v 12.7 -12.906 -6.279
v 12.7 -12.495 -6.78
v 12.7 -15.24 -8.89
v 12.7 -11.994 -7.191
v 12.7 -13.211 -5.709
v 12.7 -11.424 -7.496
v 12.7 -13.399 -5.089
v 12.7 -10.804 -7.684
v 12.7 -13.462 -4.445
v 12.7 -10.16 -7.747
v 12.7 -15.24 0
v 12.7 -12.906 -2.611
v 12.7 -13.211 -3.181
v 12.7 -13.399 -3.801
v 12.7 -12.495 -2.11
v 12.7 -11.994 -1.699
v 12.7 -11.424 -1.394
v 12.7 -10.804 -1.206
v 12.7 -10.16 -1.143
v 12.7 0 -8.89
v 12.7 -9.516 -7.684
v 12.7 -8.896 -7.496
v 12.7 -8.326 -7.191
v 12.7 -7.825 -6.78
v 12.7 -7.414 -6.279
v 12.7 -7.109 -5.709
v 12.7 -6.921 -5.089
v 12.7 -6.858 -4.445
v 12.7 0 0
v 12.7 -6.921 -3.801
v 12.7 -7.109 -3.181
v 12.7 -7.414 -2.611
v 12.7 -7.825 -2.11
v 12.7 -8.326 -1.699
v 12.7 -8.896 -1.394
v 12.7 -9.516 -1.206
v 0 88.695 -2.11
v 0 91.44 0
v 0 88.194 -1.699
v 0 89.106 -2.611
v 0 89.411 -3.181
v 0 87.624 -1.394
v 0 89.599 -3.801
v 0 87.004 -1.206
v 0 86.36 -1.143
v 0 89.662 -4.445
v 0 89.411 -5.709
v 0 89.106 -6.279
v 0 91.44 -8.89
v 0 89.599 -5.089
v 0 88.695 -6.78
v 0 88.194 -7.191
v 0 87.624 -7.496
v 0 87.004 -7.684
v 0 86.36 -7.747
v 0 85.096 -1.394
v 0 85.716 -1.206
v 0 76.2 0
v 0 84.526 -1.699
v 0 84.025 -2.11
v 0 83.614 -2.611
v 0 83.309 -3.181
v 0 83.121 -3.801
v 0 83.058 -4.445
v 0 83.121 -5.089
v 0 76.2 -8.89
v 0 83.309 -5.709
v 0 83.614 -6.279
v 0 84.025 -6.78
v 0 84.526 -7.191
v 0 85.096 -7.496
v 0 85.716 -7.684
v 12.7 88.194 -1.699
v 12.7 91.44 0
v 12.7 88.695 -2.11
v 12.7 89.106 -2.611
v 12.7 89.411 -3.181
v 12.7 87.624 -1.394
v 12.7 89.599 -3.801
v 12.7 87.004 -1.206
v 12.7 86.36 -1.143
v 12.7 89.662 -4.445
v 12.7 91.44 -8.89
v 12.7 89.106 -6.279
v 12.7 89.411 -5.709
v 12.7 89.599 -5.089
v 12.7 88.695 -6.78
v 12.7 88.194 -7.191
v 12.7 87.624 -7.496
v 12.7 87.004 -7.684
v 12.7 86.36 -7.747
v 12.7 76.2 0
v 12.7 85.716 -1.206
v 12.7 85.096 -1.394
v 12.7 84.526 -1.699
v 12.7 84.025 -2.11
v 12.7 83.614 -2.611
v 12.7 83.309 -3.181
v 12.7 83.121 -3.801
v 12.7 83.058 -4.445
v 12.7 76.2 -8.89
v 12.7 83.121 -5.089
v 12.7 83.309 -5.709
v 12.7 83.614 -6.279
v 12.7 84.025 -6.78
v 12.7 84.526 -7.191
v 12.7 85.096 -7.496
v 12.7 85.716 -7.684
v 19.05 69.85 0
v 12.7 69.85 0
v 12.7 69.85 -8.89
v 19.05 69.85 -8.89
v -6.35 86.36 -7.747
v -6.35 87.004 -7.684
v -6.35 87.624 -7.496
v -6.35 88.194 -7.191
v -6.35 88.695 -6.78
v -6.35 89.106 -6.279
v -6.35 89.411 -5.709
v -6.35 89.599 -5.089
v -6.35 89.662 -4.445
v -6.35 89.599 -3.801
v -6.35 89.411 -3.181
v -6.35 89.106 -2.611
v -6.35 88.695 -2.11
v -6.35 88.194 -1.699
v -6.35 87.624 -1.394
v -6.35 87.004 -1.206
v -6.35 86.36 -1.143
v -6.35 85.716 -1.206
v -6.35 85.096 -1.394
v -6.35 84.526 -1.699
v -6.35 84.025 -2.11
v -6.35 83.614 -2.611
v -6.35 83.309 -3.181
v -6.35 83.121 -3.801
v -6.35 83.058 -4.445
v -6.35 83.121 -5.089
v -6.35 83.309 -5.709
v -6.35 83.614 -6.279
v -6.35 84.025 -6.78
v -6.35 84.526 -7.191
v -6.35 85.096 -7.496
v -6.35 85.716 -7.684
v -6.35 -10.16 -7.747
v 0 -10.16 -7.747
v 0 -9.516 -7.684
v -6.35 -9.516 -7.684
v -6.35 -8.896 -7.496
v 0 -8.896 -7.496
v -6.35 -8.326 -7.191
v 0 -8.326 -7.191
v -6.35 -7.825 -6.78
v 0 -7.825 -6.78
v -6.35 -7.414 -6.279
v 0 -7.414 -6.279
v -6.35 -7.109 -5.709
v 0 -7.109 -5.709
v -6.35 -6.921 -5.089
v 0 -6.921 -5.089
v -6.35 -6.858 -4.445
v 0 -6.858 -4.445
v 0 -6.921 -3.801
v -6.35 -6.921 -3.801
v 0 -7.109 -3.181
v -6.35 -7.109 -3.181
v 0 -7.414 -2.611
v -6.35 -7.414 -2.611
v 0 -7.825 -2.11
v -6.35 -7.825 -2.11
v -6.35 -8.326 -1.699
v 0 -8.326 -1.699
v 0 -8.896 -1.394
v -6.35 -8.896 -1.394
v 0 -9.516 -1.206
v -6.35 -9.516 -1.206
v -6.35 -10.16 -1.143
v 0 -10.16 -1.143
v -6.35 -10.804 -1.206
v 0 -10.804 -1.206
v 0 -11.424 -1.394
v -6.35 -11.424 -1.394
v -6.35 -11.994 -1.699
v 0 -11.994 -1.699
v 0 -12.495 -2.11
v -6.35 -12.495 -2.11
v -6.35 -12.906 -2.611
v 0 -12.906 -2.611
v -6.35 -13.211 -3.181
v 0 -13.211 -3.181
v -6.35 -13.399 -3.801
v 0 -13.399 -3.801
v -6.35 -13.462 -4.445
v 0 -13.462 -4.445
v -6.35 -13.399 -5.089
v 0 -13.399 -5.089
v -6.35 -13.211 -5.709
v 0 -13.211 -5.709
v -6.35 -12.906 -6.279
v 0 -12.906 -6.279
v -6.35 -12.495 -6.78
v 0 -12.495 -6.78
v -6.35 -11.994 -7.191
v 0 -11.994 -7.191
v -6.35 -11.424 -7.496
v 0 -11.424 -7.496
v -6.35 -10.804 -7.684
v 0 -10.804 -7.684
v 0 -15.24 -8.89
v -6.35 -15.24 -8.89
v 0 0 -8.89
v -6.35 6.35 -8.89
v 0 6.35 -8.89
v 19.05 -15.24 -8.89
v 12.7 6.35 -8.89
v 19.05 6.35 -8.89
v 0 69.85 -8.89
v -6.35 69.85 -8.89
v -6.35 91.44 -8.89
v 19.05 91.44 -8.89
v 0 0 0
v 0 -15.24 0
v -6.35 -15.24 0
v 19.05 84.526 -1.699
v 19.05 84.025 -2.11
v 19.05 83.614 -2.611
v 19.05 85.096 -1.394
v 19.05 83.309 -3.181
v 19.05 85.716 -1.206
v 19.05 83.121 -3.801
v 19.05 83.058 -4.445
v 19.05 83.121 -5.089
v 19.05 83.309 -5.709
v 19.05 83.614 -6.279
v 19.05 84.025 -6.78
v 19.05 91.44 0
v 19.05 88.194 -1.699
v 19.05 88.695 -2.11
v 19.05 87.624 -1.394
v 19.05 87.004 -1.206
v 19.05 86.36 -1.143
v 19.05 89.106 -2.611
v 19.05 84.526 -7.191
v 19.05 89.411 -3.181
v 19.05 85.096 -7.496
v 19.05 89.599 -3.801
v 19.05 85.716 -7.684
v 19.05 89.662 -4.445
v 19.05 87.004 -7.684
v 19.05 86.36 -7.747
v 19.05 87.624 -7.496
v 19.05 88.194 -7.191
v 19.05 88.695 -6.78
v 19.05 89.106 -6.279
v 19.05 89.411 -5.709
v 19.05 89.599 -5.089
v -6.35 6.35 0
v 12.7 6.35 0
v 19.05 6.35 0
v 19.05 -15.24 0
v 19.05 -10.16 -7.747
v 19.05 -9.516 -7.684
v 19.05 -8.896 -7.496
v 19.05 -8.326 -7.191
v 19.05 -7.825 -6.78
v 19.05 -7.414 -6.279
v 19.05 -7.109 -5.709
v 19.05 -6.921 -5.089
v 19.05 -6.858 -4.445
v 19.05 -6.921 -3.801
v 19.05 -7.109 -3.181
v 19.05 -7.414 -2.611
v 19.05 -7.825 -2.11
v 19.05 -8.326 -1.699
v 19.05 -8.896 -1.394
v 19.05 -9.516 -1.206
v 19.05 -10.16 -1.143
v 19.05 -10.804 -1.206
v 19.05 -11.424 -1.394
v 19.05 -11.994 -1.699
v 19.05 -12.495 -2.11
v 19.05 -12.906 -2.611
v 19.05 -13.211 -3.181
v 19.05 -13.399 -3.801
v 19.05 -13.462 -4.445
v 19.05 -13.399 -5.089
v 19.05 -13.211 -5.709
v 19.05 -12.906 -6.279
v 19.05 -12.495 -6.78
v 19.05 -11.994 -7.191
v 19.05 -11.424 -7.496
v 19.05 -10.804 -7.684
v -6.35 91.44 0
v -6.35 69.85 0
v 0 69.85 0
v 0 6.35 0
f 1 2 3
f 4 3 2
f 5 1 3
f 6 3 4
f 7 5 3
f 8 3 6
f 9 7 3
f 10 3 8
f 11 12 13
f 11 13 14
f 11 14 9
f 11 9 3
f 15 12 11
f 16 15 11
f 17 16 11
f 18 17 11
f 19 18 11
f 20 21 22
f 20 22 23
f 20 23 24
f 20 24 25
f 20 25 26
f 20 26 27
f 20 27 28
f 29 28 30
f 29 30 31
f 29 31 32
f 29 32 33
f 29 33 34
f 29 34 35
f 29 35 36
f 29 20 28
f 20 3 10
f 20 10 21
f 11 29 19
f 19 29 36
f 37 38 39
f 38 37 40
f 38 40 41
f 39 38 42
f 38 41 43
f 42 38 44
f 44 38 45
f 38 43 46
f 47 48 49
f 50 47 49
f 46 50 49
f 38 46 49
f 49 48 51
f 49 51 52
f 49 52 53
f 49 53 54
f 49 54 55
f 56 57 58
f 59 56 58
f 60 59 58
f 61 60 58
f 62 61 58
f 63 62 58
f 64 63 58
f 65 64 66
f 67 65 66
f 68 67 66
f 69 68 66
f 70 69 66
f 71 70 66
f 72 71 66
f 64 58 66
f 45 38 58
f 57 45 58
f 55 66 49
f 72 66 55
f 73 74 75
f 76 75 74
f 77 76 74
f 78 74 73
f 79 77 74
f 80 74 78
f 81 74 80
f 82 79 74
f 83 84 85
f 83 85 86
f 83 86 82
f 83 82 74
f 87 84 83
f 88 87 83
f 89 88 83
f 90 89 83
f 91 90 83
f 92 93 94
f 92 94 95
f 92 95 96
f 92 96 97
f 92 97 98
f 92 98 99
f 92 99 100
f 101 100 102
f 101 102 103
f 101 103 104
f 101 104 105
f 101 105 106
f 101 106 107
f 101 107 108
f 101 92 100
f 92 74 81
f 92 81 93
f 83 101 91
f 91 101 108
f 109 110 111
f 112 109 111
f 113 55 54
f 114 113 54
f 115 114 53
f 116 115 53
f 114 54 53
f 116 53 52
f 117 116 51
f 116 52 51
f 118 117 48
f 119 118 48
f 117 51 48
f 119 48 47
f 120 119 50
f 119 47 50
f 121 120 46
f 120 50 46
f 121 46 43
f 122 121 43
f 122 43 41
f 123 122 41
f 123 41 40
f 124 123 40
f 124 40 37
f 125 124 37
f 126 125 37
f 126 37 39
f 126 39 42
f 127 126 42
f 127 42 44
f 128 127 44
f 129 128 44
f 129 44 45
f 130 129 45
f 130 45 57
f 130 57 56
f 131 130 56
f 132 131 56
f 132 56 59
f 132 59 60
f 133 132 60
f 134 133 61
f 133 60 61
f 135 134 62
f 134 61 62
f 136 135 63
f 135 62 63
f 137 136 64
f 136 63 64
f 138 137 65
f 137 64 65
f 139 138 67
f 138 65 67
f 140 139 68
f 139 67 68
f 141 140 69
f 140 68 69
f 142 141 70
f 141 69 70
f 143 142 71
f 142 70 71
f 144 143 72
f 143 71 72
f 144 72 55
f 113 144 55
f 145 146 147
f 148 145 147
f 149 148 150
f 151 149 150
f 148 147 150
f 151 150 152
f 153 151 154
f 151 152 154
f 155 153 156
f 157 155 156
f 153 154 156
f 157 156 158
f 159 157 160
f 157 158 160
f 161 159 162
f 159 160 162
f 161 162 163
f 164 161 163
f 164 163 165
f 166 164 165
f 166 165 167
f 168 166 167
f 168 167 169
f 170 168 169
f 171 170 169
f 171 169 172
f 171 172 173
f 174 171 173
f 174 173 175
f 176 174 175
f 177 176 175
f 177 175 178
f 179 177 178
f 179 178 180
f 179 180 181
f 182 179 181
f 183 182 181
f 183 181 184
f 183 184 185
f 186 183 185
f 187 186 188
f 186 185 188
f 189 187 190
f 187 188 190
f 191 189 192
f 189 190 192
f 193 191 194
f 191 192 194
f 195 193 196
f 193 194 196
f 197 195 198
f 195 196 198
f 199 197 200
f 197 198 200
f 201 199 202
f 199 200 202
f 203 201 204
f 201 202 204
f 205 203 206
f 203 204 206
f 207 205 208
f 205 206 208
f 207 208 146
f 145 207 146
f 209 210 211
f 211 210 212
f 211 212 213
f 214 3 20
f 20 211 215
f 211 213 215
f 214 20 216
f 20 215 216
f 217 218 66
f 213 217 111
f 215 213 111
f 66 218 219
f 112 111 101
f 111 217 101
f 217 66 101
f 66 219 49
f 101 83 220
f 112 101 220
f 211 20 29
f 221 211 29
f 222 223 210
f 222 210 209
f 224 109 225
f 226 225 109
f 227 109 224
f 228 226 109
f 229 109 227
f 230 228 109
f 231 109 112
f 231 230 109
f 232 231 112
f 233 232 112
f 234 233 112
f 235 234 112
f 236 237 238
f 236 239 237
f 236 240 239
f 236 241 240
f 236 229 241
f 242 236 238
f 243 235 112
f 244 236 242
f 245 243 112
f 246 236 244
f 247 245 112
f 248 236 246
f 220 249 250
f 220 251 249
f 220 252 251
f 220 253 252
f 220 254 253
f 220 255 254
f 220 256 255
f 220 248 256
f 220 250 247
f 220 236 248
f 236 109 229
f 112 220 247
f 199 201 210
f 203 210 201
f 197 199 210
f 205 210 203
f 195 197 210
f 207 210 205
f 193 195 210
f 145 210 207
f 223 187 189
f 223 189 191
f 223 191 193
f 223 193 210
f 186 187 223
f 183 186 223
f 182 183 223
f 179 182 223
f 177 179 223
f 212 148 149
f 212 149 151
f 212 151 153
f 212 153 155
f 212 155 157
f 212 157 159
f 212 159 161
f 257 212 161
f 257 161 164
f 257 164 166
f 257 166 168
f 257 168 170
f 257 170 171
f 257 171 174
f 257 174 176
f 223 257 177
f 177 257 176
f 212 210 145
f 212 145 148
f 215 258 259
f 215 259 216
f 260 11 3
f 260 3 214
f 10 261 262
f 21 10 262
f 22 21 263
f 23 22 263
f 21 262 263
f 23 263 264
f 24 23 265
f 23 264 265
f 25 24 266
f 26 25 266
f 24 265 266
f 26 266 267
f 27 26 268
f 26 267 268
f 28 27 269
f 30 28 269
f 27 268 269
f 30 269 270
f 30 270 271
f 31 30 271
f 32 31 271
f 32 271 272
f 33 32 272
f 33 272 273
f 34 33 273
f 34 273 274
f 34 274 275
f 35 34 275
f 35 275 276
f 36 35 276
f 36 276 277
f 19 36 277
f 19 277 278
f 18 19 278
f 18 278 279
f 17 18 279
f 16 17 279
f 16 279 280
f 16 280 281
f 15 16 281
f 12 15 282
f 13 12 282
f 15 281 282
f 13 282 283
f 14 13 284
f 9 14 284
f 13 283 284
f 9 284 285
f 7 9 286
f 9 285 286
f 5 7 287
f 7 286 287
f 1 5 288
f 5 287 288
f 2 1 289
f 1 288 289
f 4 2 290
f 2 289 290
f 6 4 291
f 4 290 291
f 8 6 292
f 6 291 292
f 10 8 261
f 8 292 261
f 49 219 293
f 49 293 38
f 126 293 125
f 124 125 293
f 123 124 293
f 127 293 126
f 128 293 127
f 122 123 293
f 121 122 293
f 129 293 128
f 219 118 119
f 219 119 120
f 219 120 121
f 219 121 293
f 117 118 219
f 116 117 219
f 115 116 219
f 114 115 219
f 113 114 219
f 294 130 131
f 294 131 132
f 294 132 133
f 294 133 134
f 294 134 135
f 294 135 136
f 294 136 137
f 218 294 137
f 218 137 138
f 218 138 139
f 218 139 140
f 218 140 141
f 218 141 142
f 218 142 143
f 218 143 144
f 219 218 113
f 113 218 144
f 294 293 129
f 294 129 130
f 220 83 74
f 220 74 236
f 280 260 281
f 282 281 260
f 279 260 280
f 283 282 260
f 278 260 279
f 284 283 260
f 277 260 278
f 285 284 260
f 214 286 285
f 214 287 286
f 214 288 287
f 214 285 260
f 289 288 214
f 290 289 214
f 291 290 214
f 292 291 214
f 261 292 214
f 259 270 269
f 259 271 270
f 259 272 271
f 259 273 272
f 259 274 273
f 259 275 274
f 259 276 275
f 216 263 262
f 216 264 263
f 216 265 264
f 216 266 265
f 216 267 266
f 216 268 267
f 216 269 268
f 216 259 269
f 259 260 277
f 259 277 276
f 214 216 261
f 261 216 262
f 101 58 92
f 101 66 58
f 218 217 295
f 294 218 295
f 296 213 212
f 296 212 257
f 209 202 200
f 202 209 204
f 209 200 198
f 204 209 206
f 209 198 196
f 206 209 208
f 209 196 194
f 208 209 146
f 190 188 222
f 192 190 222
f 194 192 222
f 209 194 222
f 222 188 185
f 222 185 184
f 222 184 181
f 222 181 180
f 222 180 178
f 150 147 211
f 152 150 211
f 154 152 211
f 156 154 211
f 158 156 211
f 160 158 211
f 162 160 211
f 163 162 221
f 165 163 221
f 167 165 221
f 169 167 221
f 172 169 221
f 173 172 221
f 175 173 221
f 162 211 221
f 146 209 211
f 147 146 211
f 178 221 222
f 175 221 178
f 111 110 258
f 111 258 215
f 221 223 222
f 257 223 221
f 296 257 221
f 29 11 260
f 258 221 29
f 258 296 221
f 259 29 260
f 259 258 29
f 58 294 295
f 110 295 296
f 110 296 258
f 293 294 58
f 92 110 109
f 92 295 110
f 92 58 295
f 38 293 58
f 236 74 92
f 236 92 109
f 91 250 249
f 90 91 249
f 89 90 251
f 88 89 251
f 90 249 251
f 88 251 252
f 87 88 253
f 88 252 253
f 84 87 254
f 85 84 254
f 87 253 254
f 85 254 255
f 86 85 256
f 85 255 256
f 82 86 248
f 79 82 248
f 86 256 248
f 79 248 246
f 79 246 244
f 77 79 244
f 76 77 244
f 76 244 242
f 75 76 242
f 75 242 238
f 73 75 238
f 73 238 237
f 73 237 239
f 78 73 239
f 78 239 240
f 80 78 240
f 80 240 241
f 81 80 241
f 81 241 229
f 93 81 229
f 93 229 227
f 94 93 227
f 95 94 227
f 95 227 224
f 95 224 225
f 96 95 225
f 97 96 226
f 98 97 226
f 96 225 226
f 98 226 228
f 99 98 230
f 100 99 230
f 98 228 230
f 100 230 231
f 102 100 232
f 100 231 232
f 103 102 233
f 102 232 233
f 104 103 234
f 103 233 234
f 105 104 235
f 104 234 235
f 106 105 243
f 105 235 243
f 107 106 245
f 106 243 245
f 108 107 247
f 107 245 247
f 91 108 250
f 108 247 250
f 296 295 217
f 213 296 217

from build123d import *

# Parameters (mm, degrees)
SKETCH1_W           = 12.7
SKETCH1_H           = 8.89
BOSS_EXTRUDE1_DEPTH = 76.2
SKETCH2_W           = 8.89
SKETCH2_H           = 6.35
BOSS_EXTRUDE2_DEPTH = 6.35
SKETCH3_W           = 8.89
SKETCH3_H           = 6.35
BOSS_EXTRUDE3_DEPTH = 6.35
SKETCH4_W           = 6.35
SKETCH4_H           = 8.89
BOSS_EXTRUDE4_DEPTH = 15.24
SKETCH7_W           = 6.35
SKETCH7_H           = 8.89
BOSS_EXTRUDE5_DEPTH = 15.24
SKETCH8_R           = 3.302
CUT_EXTRUDE2_DEPTH  = 35.306
SKETCH6_R           = 3.302
CUT_EXTRUDE3_DEPTH  = 33.528


with BuildPart() as part:
    # Sketch1 → Boss-Extrude1 (new body)
    with BuildSketch(Plane(origin=(0, 0, 0), x_dir=(1, 0, 0), z_dir=(0, 1, 0))):
        with Locations((6.35, 4.445)):
            Rectangle(SKETCH1_W, SKETCH1_H)
    extrude(amount=BOSS_EXTRUDE1_DEPTH)

    # Sketch2 → Boss-Extrude2 (add)
    with BuildSketch(Plane(origin=(12.7, 0, 0), x_dir=(0, 0, -1), z_dir=(1, 0, 0))):
        with Locations((4.445, 3.175)):
            Rectangle(SKETCH2_W, SKETCH2_H)
        with Locations((4.445, 73.025)):
            Rectangle(SKETCH2_W, SKETCH2_H)
    extrude(amount=BOSS_EXTRUDE2_DEPTH)

    # Sketch3 → Boss-Extrude3 (add)
    with BuildSketch(Plane.ZY):
        with Locations((-4.445, 3.175)):
            Rectangle(SKETCH3_W, SKETCH3_H)
        with Locations((-4.445, 73.025)):
            Rectangle(SKETCH3_W, SKETCH3_H)
    extrude(amount=BOSS_EXTRUDE3_DEPTH)

    # Sketch4 → Boss-Extrude4 (add)
    with BuildSketch(Plane(origin=(0, 76.2, 0), x_dir=(1, 0, 0), z_dir=(0, 1, 0))):
        with Locations((-3.175, 4.445)):
            Rectangle(SKETCH4_W, SKETCH4_H)
        with Locations((15.875, 4.445)):
            Rectangle(SKETCH4_W, SKETCH4_H)
    extrude(amount=BOSS_EXTRUDE4_DEPTH)

    # Sketch7 → Boss-Extrude5 (add)
    with BuildSketch(Plane.XZ):
        with Locations((-3.175, -4.445)):
            Rectangle(SKETCH7_W, SKETCH7_H)
        with Locations((15.875, -4.445)):
            Rectangle(SKETCH7_W, SKETCH7_H)
    extrude(amount=BOSS_EXTRUDE5_DEPTH)

    # Sketch8 → Cut-Extrude2 (cut)
    with BuildSketch(Plane(origin=(19.05, 0, 0), x_dir=(0, 0, -1), z_dir=(1, 0, 0))):
        with Locations((4.445, -10.16)):
            Circle(SKETCH8_R)
    extrude(amount=-CUT_EXTRUDE2_DEPTH, mode=Mode.SUBTRACT)

    # Sketch6 → Cut-Extrude3 (cut)
    with BuildSketch(Plane(origin=(19.05, 0, 0), x_dir=(0, 0, -1), z_dir=(1, 0, 0))):
        with Locations((4.445, 86.36)):
            Circle(SKETCH6_R)
    extrude(amount=-CUT_EXTRUDE3_DEPTH, mode=Mode.SUBTRACT)


solid = part.part
